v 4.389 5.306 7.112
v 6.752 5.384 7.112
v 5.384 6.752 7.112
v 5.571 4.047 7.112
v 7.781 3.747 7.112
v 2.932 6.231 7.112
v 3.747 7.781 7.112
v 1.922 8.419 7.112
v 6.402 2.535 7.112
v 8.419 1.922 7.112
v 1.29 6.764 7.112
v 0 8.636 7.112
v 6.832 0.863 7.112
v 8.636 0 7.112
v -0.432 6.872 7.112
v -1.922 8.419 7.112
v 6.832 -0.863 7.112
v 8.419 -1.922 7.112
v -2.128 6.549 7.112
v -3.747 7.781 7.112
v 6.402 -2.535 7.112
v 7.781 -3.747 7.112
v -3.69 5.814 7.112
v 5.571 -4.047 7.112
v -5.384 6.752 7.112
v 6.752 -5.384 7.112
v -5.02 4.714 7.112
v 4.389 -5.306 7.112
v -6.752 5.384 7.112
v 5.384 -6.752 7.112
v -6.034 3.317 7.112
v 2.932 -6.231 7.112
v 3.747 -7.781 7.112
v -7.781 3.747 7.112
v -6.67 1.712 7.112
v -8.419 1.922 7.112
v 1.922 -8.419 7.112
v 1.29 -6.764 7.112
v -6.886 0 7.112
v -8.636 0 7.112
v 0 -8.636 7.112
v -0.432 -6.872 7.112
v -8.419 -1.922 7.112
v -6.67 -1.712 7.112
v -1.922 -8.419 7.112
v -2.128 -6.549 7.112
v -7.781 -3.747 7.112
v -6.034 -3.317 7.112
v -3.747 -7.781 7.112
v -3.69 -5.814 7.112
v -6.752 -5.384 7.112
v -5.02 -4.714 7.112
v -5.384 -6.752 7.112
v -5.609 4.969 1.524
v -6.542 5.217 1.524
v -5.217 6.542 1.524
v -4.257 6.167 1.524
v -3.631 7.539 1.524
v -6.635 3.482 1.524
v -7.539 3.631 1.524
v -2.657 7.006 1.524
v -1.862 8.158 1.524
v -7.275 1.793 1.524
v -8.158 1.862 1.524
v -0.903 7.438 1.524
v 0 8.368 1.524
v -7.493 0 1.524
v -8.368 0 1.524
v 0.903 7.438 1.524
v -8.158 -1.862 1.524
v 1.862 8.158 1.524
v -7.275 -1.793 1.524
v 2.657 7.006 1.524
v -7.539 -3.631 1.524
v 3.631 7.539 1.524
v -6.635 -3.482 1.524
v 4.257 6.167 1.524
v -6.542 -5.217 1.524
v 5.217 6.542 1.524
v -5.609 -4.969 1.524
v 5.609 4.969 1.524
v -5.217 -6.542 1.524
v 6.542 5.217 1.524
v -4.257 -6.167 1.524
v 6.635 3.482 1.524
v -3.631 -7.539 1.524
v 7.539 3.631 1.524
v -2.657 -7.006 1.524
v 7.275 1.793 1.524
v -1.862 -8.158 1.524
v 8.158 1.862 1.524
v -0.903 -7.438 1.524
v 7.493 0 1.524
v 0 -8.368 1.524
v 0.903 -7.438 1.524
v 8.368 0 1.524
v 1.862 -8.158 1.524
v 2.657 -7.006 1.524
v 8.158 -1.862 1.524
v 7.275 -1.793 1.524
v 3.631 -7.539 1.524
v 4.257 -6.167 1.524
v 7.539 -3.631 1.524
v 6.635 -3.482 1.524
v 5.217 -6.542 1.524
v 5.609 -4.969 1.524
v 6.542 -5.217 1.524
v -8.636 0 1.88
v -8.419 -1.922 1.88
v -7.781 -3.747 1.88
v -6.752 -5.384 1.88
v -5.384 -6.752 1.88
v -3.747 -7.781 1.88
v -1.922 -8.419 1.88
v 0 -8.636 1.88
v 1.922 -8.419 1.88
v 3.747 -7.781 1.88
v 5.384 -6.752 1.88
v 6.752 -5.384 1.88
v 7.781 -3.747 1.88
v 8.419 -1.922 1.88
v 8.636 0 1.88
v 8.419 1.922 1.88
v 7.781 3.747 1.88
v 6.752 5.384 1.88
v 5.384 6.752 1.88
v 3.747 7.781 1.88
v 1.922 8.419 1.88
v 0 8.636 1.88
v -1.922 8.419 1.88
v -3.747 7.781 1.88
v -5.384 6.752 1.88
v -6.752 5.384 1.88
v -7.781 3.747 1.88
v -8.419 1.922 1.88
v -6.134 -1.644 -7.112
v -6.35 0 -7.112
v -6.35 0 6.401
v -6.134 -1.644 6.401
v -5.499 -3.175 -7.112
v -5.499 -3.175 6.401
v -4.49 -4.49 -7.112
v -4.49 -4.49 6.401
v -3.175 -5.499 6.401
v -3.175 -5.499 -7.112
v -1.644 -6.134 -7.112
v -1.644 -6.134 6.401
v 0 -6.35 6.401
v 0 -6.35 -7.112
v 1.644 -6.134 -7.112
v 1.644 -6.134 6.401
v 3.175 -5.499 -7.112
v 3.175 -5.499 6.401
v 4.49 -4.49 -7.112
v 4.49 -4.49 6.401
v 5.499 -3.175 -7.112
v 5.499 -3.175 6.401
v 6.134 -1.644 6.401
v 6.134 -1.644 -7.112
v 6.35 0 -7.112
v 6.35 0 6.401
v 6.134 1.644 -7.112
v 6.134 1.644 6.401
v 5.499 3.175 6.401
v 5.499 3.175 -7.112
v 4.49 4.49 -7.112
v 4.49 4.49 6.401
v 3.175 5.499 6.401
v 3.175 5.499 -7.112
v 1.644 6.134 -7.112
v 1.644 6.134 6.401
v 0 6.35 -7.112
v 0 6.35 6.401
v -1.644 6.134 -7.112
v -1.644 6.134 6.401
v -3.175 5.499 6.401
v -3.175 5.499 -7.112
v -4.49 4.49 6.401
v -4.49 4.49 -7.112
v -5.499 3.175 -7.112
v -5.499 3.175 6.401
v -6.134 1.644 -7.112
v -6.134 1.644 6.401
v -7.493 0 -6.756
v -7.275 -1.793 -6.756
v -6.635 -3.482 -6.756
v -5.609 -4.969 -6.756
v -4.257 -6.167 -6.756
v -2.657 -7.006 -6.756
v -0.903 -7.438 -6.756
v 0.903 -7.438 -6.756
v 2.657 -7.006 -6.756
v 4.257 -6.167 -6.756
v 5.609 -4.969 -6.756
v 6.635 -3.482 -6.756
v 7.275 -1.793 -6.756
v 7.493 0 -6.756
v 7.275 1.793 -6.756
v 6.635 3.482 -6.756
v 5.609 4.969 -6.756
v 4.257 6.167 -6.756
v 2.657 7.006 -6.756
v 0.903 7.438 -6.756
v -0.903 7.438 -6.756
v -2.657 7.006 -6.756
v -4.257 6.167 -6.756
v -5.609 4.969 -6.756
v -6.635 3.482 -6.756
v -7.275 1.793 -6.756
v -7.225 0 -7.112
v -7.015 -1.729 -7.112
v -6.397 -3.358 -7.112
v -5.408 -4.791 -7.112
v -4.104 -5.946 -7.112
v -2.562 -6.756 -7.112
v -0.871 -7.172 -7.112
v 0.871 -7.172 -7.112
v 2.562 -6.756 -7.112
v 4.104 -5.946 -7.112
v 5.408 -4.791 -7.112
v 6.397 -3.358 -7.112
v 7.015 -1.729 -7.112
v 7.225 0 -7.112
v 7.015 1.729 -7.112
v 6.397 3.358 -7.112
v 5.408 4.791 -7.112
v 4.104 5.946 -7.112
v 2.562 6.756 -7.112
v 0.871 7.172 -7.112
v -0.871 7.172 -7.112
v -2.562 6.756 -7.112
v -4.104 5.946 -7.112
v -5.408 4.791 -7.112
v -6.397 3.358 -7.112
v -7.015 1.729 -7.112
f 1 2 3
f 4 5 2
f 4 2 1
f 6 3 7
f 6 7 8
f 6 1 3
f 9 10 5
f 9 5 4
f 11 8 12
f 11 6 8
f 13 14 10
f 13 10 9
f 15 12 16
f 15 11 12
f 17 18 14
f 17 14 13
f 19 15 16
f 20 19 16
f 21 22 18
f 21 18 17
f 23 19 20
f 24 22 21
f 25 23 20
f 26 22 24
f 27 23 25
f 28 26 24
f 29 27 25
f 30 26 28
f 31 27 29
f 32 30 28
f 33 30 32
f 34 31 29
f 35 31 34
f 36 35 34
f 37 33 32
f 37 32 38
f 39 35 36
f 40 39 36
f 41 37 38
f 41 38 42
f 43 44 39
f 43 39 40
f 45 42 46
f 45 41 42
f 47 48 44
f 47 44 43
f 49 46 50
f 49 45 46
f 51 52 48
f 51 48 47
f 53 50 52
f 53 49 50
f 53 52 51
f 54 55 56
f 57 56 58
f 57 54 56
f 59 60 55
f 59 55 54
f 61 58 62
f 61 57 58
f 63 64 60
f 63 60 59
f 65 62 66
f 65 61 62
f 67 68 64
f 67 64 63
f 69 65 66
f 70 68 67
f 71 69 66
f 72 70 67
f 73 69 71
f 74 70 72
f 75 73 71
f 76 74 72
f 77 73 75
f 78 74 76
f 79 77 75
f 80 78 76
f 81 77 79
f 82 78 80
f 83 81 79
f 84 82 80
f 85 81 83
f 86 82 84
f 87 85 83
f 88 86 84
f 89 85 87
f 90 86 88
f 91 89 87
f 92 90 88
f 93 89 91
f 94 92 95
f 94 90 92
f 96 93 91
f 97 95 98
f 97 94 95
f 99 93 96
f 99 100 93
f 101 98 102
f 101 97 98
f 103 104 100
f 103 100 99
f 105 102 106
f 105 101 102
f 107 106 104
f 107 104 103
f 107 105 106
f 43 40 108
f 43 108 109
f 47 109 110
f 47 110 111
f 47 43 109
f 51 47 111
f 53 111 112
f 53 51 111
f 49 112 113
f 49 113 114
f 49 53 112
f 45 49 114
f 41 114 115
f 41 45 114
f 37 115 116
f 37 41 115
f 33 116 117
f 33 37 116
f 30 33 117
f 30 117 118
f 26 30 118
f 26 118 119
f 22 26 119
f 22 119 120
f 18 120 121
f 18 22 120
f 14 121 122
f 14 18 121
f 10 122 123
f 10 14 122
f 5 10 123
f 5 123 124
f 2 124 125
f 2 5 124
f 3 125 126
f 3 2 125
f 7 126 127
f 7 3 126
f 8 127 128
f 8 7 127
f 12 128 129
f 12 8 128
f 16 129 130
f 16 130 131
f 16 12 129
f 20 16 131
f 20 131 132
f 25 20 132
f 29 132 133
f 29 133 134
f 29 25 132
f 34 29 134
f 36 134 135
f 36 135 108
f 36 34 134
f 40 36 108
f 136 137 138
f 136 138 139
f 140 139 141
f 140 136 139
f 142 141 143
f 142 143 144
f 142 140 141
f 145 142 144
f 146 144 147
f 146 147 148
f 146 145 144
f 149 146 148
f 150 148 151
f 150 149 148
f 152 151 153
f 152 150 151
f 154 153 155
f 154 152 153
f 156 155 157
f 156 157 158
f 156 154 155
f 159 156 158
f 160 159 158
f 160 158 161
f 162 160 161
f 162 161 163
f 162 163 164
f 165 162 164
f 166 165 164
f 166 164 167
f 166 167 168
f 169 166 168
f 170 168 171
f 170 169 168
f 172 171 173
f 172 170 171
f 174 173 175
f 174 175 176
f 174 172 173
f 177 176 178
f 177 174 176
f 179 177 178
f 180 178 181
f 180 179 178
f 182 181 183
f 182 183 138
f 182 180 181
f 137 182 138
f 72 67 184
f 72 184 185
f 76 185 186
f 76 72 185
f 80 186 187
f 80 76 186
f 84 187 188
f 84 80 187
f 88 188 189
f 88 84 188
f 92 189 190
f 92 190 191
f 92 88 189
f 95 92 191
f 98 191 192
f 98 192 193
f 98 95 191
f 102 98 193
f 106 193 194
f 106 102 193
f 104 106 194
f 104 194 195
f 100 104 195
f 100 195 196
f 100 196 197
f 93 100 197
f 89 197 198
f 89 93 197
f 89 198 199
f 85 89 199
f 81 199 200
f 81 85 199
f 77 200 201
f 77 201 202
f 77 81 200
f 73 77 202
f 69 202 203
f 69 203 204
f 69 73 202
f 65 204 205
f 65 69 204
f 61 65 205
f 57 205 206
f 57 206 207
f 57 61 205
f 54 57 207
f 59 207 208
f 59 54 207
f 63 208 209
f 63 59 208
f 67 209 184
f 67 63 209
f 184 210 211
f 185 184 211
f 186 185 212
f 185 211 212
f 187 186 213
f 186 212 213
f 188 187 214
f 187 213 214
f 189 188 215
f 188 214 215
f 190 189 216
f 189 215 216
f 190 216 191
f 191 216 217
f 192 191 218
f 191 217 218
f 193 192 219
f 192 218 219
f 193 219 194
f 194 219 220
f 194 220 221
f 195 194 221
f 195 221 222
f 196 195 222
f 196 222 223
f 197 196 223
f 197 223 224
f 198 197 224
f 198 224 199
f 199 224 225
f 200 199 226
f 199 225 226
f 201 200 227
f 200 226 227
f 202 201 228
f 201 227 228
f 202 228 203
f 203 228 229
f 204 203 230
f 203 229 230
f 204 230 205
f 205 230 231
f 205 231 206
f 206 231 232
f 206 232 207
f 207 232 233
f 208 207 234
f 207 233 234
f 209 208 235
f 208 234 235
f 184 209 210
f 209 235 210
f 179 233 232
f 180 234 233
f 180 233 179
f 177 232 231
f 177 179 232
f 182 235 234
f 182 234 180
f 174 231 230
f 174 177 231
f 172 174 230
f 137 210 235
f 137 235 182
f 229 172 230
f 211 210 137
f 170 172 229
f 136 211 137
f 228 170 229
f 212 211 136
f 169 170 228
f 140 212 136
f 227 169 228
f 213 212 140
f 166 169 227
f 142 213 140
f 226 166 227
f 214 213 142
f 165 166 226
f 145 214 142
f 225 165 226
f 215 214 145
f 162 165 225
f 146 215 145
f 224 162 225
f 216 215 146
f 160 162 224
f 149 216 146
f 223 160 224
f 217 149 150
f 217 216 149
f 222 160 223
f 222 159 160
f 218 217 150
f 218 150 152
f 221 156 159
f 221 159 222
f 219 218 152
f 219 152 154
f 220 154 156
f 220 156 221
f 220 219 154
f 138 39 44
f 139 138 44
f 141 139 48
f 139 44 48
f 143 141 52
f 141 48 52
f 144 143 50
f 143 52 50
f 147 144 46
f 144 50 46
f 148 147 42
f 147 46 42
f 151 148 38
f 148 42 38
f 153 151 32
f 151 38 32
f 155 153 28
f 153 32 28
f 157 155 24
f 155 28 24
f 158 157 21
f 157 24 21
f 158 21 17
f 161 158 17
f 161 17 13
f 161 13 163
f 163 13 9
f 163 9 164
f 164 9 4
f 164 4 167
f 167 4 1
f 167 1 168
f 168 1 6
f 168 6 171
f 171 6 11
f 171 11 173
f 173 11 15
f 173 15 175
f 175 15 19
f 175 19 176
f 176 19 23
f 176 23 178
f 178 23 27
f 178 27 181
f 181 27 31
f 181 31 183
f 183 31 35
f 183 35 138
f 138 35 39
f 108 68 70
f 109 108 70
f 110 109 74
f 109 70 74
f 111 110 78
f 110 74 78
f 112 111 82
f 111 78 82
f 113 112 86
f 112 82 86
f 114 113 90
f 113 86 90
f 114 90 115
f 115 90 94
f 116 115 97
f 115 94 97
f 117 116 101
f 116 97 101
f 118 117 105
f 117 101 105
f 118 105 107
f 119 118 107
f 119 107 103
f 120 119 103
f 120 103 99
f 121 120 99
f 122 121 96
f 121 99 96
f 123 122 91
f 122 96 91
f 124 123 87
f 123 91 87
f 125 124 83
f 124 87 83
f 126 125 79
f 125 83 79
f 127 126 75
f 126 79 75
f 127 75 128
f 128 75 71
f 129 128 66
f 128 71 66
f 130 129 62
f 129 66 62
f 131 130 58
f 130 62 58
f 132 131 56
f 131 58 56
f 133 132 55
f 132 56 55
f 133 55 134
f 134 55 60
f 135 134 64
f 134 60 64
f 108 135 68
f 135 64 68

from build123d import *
from OCP.BRepFilletAPI import BRepFilletAPI_MakeChamfer

# Parameters (mm, degrees)
CHAMFER1_SIZE  = 0.7112
CHAMFER1_SIZE2 = 0.53592764
CHAMFER2_SIZE  = 0.3556
CHAMFER2_SIZE2 = 0.26796382


with BuildPart() as part:
    # Sketch2 → Revolve1 (revolve)
    with BuildSketch(Plane(origin=(0, 0, 0), x_dir=(0, 0, -1), z_dir=(1, 0, 0)), mode=Mode.PRIVATE) as revolve1_sk:
        Polygon((7.112, 6.35), (7.112, 7.493), (-1.524, 7.493), (-1.524, 8.636), (-7.112, 8.636), (-7.112, 6.35), align=None)
    revolve(revolve1_sk.sketch.rotate(Axis((0, 0, -7.112), (0, 0, 1)), 90), axis=Axis((0, 0, -7.112), (0, 0, 1)))

    # Chamfer1
    chamfer1_edges = [part.edges().sort_by_distance(p)[0] for p in [
        (6.35, 0, 7.112),
    ]]
    chamfer1_side = [part.faces().sort_by_distance(p)[0] for p in [
        (6.35, 0, 0),
    ]]
    chamfer(chamfer1_edges, length=CHAMFER1_SIZE, length2=CHAMFER1_SIZE2, reference=chamfer1_side[0])

    # Chamfer2: one chamfer whose edges measure the first distance from different faces: ONE call of the kernel's chamfer builder (chamfer() names one face for all edges)
    chamfer2_edges_1 = [part.edges().sort_by_distance(p)[0] for p in [
        (8.636, 0, 1.524),
    ]]
    chamfer2_side_1 = [part.faces().sort_by_distance(p)[0] for p in [
        (8.636, 0, 4.318),
    ]]
    chamfer2_edges_2 = [part.edges().sort_by_distance(p)[0] for p in [
        (7.493, 0, -7.112),
    ]]
    chamfer2_side_2 = [part.faces().sort_by_distance(p)[0] for p in [
        (7.493, 0, -2.794),
    ]]
    chamfer2 = BRepFilletAPI_MakeChamfer(part.part.solid().wrapped)
    for e in chamfer2_edges_1:
        chamfer2.Add(CHAMFER2_SIZE, CHAMFER2_SIZE2, e.wrapped, chamfer2_side_1[0].wrapped)  # the first distance lies on this face
    for e in chamfer2_edges_2:
        chamfer2.Add(CHAMFER2_SIZE, CHAMFER2_SIZE2, e.wrapped, chamfer2_side_2[0].wrapped)  # the first distance lies on this face
    add(Compound.cast(chamfer2.Shape()), mode=Mode.REPLACE)


solid = part.part
